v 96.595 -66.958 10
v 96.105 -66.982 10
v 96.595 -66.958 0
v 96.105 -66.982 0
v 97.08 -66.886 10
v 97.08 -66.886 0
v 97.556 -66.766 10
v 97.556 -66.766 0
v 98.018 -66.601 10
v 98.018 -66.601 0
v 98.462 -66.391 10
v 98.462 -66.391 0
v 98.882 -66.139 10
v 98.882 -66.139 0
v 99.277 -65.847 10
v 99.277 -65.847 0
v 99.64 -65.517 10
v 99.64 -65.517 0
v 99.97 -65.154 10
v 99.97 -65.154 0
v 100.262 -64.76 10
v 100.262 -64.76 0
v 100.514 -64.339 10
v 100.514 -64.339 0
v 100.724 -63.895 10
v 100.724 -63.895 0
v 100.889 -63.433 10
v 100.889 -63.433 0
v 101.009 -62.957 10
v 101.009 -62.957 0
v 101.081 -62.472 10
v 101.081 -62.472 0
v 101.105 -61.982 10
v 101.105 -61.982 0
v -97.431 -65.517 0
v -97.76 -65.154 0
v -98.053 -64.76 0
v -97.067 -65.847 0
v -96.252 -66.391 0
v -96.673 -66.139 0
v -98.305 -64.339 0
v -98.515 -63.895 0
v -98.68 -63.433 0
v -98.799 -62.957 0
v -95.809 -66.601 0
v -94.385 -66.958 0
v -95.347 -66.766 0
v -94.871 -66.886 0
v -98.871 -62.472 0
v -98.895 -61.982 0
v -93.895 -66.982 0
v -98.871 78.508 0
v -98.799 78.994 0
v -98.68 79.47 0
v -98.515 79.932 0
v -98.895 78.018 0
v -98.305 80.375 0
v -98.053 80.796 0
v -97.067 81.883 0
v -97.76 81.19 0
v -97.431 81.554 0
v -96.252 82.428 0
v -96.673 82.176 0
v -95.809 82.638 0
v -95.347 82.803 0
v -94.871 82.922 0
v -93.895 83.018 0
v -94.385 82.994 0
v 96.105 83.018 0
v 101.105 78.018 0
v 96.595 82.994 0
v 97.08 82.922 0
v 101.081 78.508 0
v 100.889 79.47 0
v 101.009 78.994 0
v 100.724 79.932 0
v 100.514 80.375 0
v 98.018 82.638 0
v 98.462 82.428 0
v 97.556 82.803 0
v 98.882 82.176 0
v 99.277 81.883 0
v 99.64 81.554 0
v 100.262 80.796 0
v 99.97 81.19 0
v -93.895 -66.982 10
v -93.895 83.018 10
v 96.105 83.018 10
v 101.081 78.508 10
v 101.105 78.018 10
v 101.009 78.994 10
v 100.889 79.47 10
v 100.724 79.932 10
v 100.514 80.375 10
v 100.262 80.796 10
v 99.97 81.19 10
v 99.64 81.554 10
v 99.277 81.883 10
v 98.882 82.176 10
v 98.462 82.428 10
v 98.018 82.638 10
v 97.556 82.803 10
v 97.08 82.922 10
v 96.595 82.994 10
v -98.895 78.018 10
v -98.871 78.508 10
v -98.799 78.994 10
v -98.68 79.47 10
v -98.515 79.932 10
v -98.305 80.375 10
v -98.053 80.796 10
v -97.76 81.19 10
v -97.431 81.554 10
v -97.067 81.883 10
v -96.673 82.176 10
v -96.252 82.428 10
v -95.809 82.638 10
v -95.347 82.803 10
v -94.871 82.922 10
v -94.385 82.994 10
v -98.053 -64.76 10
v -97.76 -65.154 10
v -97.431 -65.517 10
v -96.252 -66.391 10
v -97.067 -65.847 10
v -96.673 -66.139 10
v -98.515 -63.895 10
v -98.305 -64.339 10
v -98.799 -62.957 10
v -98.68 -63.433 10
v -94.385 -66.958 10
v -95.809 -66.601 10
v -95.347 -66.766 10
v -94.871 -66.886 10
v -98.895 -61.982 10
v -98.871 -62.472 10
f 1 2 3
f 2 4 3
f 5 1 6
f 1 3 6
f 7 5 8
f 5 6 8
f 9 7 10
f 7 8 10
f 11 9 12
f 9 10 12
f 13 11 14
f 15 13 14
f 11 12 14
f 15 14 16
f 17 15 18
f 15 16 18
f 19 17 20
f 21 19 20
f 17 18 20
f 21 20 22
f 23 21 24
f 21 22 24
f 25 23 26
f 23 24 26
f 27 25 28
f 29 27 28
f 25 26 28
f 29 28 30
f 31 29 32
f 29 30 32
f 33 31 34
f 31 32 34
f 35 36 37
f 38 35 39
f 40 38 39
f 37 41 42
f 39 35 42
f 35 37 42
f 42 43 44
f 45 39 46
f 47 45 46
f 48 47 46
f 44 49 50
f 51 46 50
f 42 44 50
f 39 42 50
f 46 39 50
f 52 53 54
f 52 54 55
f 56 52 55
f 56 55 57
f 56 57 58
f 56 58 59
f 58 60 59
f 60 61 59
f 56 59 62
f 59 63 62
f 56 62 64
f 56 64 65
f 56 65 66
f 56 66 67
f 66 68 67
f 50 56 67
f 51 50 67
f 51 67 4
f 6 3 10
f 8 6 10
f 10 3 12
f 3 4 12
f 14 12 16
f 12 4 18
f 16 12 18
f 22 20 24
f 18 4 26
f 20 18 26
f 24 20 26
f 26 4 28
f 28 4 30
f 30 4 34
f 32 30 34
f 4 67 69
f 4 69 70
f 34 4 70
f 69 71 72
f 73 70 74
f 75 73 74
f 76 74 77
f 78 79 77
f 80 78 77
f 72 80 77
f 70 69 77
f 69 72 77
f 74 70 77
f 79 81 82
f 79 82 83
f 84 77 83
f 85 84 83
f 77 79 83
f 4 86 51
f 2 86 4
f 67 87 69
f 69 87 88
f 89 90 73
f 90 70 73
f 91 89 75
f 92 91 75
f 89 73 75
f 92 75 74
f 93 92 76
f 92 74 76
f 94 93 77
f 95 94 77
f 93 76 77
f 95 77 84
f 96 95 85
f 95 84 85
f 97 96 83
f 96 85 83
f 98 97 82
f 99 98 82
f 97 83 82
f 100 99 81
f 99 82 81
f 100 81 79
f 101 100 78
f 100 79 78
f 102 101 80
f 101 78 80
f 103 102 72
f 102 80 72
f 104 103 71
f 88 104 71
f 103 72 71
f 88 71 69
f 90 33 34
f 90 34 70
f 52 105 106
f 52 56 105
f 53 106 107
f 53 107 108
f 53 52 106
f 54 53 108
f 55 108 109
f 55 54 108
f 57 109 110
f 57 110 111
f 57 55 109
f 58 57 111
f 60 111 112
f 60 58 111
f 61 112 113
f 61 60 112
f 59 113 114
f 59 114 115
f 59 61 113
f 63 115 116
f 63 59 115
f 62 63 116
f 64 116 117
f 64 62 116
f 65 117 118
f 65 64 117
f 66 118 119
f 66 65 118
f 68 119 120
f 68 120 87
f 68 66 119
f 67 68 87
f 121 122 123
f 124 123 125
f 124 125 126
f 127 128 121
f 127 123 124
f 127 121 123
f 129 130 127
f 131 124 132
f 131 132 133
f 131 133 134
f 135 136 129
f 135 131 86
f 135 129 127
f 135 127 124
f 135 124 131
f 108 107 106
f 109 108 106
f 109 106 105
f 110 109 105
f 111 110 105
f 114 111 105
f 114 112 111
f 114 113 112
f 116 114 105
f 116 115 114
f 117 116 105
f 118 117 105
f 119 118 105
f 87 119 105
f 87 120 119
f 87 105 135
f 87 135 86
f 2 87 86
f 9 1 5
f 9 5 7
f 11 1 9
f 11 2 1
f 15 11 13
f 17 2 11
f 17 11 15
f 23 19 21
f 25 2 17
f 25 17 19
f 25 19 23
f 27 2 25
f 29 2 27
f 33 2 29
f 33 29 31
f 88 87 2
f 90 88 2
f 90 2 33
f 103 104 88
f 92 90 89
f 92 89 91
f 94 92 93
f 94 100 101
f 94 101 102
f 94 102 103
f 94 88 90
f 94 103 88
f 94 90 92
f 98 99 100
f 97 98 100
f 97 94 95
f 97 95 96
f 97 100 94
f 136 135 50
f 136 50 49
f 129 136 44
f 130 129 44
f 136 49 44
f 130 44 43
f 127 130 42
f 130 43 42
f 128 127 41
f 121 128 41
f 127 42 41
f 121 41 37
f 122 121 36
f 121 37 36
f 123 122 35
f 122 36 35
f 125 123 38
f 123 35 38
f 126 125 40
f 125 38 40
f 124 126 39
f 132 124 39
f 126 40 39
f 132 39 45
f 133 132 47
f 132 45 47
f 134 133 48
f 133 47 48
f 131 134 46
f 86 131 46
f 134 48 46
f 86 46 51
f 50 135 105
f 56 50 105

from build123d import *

# Parameters (mm, degrees)
F0_W     = 200
F0_H     = 150
F1_DEPTH = 5
F2_R     = 5
F3_R     = 5
F4_R     = 5
F5_R     = 5


with BuildPart() as f1:
    # F0 (on Top) → F1 (new body)
    with BuildSketch(Plane.XY):
        with Locations((1.104623, 8.018312)):
            Rectangle(F0_W, F0_H)
    extrude(amount=F1_DEPTH)

    # F2
    f2_edges = [f1.edges().sort_by_distance(p)[0] for p in [
        (-98.895377, -66.981688, 2.5),
    ]]
    fillet(f2_edges, radius=F2_R)

    # F3
    f3_edges = [f1.edges().sort_by_distance(p)[0] for p in [
        (-98.895377, 83.018312, 2.5),
    ]]
    fillet(f3_edges, radius=F3_R)

    # F4
    f4_edges = [f1.edges().sort_by_distance(p)[0] for p in [
        (101.104623, -66.981688, 2.5),
    ]]
    fillet(f4_edges, radius=F4_R)

    # F5
    f5_edges = [f1.edges().sort_by_distance(p)[0] for p in [
        (101.104623, 83.018312, 2.5),
    ]]
    fillet(f5_edges, radius=F5_R)

    # F7: F1 across face


with BuildPart() as f1_1:
    add(f1.part)
    add(f1.part.mirror(Plane(origin=(1.104623, 8.018312, 5), x_dir=(1, 0, 0), z_dir=(0, 0, 1))))


solid = f1_1.part
